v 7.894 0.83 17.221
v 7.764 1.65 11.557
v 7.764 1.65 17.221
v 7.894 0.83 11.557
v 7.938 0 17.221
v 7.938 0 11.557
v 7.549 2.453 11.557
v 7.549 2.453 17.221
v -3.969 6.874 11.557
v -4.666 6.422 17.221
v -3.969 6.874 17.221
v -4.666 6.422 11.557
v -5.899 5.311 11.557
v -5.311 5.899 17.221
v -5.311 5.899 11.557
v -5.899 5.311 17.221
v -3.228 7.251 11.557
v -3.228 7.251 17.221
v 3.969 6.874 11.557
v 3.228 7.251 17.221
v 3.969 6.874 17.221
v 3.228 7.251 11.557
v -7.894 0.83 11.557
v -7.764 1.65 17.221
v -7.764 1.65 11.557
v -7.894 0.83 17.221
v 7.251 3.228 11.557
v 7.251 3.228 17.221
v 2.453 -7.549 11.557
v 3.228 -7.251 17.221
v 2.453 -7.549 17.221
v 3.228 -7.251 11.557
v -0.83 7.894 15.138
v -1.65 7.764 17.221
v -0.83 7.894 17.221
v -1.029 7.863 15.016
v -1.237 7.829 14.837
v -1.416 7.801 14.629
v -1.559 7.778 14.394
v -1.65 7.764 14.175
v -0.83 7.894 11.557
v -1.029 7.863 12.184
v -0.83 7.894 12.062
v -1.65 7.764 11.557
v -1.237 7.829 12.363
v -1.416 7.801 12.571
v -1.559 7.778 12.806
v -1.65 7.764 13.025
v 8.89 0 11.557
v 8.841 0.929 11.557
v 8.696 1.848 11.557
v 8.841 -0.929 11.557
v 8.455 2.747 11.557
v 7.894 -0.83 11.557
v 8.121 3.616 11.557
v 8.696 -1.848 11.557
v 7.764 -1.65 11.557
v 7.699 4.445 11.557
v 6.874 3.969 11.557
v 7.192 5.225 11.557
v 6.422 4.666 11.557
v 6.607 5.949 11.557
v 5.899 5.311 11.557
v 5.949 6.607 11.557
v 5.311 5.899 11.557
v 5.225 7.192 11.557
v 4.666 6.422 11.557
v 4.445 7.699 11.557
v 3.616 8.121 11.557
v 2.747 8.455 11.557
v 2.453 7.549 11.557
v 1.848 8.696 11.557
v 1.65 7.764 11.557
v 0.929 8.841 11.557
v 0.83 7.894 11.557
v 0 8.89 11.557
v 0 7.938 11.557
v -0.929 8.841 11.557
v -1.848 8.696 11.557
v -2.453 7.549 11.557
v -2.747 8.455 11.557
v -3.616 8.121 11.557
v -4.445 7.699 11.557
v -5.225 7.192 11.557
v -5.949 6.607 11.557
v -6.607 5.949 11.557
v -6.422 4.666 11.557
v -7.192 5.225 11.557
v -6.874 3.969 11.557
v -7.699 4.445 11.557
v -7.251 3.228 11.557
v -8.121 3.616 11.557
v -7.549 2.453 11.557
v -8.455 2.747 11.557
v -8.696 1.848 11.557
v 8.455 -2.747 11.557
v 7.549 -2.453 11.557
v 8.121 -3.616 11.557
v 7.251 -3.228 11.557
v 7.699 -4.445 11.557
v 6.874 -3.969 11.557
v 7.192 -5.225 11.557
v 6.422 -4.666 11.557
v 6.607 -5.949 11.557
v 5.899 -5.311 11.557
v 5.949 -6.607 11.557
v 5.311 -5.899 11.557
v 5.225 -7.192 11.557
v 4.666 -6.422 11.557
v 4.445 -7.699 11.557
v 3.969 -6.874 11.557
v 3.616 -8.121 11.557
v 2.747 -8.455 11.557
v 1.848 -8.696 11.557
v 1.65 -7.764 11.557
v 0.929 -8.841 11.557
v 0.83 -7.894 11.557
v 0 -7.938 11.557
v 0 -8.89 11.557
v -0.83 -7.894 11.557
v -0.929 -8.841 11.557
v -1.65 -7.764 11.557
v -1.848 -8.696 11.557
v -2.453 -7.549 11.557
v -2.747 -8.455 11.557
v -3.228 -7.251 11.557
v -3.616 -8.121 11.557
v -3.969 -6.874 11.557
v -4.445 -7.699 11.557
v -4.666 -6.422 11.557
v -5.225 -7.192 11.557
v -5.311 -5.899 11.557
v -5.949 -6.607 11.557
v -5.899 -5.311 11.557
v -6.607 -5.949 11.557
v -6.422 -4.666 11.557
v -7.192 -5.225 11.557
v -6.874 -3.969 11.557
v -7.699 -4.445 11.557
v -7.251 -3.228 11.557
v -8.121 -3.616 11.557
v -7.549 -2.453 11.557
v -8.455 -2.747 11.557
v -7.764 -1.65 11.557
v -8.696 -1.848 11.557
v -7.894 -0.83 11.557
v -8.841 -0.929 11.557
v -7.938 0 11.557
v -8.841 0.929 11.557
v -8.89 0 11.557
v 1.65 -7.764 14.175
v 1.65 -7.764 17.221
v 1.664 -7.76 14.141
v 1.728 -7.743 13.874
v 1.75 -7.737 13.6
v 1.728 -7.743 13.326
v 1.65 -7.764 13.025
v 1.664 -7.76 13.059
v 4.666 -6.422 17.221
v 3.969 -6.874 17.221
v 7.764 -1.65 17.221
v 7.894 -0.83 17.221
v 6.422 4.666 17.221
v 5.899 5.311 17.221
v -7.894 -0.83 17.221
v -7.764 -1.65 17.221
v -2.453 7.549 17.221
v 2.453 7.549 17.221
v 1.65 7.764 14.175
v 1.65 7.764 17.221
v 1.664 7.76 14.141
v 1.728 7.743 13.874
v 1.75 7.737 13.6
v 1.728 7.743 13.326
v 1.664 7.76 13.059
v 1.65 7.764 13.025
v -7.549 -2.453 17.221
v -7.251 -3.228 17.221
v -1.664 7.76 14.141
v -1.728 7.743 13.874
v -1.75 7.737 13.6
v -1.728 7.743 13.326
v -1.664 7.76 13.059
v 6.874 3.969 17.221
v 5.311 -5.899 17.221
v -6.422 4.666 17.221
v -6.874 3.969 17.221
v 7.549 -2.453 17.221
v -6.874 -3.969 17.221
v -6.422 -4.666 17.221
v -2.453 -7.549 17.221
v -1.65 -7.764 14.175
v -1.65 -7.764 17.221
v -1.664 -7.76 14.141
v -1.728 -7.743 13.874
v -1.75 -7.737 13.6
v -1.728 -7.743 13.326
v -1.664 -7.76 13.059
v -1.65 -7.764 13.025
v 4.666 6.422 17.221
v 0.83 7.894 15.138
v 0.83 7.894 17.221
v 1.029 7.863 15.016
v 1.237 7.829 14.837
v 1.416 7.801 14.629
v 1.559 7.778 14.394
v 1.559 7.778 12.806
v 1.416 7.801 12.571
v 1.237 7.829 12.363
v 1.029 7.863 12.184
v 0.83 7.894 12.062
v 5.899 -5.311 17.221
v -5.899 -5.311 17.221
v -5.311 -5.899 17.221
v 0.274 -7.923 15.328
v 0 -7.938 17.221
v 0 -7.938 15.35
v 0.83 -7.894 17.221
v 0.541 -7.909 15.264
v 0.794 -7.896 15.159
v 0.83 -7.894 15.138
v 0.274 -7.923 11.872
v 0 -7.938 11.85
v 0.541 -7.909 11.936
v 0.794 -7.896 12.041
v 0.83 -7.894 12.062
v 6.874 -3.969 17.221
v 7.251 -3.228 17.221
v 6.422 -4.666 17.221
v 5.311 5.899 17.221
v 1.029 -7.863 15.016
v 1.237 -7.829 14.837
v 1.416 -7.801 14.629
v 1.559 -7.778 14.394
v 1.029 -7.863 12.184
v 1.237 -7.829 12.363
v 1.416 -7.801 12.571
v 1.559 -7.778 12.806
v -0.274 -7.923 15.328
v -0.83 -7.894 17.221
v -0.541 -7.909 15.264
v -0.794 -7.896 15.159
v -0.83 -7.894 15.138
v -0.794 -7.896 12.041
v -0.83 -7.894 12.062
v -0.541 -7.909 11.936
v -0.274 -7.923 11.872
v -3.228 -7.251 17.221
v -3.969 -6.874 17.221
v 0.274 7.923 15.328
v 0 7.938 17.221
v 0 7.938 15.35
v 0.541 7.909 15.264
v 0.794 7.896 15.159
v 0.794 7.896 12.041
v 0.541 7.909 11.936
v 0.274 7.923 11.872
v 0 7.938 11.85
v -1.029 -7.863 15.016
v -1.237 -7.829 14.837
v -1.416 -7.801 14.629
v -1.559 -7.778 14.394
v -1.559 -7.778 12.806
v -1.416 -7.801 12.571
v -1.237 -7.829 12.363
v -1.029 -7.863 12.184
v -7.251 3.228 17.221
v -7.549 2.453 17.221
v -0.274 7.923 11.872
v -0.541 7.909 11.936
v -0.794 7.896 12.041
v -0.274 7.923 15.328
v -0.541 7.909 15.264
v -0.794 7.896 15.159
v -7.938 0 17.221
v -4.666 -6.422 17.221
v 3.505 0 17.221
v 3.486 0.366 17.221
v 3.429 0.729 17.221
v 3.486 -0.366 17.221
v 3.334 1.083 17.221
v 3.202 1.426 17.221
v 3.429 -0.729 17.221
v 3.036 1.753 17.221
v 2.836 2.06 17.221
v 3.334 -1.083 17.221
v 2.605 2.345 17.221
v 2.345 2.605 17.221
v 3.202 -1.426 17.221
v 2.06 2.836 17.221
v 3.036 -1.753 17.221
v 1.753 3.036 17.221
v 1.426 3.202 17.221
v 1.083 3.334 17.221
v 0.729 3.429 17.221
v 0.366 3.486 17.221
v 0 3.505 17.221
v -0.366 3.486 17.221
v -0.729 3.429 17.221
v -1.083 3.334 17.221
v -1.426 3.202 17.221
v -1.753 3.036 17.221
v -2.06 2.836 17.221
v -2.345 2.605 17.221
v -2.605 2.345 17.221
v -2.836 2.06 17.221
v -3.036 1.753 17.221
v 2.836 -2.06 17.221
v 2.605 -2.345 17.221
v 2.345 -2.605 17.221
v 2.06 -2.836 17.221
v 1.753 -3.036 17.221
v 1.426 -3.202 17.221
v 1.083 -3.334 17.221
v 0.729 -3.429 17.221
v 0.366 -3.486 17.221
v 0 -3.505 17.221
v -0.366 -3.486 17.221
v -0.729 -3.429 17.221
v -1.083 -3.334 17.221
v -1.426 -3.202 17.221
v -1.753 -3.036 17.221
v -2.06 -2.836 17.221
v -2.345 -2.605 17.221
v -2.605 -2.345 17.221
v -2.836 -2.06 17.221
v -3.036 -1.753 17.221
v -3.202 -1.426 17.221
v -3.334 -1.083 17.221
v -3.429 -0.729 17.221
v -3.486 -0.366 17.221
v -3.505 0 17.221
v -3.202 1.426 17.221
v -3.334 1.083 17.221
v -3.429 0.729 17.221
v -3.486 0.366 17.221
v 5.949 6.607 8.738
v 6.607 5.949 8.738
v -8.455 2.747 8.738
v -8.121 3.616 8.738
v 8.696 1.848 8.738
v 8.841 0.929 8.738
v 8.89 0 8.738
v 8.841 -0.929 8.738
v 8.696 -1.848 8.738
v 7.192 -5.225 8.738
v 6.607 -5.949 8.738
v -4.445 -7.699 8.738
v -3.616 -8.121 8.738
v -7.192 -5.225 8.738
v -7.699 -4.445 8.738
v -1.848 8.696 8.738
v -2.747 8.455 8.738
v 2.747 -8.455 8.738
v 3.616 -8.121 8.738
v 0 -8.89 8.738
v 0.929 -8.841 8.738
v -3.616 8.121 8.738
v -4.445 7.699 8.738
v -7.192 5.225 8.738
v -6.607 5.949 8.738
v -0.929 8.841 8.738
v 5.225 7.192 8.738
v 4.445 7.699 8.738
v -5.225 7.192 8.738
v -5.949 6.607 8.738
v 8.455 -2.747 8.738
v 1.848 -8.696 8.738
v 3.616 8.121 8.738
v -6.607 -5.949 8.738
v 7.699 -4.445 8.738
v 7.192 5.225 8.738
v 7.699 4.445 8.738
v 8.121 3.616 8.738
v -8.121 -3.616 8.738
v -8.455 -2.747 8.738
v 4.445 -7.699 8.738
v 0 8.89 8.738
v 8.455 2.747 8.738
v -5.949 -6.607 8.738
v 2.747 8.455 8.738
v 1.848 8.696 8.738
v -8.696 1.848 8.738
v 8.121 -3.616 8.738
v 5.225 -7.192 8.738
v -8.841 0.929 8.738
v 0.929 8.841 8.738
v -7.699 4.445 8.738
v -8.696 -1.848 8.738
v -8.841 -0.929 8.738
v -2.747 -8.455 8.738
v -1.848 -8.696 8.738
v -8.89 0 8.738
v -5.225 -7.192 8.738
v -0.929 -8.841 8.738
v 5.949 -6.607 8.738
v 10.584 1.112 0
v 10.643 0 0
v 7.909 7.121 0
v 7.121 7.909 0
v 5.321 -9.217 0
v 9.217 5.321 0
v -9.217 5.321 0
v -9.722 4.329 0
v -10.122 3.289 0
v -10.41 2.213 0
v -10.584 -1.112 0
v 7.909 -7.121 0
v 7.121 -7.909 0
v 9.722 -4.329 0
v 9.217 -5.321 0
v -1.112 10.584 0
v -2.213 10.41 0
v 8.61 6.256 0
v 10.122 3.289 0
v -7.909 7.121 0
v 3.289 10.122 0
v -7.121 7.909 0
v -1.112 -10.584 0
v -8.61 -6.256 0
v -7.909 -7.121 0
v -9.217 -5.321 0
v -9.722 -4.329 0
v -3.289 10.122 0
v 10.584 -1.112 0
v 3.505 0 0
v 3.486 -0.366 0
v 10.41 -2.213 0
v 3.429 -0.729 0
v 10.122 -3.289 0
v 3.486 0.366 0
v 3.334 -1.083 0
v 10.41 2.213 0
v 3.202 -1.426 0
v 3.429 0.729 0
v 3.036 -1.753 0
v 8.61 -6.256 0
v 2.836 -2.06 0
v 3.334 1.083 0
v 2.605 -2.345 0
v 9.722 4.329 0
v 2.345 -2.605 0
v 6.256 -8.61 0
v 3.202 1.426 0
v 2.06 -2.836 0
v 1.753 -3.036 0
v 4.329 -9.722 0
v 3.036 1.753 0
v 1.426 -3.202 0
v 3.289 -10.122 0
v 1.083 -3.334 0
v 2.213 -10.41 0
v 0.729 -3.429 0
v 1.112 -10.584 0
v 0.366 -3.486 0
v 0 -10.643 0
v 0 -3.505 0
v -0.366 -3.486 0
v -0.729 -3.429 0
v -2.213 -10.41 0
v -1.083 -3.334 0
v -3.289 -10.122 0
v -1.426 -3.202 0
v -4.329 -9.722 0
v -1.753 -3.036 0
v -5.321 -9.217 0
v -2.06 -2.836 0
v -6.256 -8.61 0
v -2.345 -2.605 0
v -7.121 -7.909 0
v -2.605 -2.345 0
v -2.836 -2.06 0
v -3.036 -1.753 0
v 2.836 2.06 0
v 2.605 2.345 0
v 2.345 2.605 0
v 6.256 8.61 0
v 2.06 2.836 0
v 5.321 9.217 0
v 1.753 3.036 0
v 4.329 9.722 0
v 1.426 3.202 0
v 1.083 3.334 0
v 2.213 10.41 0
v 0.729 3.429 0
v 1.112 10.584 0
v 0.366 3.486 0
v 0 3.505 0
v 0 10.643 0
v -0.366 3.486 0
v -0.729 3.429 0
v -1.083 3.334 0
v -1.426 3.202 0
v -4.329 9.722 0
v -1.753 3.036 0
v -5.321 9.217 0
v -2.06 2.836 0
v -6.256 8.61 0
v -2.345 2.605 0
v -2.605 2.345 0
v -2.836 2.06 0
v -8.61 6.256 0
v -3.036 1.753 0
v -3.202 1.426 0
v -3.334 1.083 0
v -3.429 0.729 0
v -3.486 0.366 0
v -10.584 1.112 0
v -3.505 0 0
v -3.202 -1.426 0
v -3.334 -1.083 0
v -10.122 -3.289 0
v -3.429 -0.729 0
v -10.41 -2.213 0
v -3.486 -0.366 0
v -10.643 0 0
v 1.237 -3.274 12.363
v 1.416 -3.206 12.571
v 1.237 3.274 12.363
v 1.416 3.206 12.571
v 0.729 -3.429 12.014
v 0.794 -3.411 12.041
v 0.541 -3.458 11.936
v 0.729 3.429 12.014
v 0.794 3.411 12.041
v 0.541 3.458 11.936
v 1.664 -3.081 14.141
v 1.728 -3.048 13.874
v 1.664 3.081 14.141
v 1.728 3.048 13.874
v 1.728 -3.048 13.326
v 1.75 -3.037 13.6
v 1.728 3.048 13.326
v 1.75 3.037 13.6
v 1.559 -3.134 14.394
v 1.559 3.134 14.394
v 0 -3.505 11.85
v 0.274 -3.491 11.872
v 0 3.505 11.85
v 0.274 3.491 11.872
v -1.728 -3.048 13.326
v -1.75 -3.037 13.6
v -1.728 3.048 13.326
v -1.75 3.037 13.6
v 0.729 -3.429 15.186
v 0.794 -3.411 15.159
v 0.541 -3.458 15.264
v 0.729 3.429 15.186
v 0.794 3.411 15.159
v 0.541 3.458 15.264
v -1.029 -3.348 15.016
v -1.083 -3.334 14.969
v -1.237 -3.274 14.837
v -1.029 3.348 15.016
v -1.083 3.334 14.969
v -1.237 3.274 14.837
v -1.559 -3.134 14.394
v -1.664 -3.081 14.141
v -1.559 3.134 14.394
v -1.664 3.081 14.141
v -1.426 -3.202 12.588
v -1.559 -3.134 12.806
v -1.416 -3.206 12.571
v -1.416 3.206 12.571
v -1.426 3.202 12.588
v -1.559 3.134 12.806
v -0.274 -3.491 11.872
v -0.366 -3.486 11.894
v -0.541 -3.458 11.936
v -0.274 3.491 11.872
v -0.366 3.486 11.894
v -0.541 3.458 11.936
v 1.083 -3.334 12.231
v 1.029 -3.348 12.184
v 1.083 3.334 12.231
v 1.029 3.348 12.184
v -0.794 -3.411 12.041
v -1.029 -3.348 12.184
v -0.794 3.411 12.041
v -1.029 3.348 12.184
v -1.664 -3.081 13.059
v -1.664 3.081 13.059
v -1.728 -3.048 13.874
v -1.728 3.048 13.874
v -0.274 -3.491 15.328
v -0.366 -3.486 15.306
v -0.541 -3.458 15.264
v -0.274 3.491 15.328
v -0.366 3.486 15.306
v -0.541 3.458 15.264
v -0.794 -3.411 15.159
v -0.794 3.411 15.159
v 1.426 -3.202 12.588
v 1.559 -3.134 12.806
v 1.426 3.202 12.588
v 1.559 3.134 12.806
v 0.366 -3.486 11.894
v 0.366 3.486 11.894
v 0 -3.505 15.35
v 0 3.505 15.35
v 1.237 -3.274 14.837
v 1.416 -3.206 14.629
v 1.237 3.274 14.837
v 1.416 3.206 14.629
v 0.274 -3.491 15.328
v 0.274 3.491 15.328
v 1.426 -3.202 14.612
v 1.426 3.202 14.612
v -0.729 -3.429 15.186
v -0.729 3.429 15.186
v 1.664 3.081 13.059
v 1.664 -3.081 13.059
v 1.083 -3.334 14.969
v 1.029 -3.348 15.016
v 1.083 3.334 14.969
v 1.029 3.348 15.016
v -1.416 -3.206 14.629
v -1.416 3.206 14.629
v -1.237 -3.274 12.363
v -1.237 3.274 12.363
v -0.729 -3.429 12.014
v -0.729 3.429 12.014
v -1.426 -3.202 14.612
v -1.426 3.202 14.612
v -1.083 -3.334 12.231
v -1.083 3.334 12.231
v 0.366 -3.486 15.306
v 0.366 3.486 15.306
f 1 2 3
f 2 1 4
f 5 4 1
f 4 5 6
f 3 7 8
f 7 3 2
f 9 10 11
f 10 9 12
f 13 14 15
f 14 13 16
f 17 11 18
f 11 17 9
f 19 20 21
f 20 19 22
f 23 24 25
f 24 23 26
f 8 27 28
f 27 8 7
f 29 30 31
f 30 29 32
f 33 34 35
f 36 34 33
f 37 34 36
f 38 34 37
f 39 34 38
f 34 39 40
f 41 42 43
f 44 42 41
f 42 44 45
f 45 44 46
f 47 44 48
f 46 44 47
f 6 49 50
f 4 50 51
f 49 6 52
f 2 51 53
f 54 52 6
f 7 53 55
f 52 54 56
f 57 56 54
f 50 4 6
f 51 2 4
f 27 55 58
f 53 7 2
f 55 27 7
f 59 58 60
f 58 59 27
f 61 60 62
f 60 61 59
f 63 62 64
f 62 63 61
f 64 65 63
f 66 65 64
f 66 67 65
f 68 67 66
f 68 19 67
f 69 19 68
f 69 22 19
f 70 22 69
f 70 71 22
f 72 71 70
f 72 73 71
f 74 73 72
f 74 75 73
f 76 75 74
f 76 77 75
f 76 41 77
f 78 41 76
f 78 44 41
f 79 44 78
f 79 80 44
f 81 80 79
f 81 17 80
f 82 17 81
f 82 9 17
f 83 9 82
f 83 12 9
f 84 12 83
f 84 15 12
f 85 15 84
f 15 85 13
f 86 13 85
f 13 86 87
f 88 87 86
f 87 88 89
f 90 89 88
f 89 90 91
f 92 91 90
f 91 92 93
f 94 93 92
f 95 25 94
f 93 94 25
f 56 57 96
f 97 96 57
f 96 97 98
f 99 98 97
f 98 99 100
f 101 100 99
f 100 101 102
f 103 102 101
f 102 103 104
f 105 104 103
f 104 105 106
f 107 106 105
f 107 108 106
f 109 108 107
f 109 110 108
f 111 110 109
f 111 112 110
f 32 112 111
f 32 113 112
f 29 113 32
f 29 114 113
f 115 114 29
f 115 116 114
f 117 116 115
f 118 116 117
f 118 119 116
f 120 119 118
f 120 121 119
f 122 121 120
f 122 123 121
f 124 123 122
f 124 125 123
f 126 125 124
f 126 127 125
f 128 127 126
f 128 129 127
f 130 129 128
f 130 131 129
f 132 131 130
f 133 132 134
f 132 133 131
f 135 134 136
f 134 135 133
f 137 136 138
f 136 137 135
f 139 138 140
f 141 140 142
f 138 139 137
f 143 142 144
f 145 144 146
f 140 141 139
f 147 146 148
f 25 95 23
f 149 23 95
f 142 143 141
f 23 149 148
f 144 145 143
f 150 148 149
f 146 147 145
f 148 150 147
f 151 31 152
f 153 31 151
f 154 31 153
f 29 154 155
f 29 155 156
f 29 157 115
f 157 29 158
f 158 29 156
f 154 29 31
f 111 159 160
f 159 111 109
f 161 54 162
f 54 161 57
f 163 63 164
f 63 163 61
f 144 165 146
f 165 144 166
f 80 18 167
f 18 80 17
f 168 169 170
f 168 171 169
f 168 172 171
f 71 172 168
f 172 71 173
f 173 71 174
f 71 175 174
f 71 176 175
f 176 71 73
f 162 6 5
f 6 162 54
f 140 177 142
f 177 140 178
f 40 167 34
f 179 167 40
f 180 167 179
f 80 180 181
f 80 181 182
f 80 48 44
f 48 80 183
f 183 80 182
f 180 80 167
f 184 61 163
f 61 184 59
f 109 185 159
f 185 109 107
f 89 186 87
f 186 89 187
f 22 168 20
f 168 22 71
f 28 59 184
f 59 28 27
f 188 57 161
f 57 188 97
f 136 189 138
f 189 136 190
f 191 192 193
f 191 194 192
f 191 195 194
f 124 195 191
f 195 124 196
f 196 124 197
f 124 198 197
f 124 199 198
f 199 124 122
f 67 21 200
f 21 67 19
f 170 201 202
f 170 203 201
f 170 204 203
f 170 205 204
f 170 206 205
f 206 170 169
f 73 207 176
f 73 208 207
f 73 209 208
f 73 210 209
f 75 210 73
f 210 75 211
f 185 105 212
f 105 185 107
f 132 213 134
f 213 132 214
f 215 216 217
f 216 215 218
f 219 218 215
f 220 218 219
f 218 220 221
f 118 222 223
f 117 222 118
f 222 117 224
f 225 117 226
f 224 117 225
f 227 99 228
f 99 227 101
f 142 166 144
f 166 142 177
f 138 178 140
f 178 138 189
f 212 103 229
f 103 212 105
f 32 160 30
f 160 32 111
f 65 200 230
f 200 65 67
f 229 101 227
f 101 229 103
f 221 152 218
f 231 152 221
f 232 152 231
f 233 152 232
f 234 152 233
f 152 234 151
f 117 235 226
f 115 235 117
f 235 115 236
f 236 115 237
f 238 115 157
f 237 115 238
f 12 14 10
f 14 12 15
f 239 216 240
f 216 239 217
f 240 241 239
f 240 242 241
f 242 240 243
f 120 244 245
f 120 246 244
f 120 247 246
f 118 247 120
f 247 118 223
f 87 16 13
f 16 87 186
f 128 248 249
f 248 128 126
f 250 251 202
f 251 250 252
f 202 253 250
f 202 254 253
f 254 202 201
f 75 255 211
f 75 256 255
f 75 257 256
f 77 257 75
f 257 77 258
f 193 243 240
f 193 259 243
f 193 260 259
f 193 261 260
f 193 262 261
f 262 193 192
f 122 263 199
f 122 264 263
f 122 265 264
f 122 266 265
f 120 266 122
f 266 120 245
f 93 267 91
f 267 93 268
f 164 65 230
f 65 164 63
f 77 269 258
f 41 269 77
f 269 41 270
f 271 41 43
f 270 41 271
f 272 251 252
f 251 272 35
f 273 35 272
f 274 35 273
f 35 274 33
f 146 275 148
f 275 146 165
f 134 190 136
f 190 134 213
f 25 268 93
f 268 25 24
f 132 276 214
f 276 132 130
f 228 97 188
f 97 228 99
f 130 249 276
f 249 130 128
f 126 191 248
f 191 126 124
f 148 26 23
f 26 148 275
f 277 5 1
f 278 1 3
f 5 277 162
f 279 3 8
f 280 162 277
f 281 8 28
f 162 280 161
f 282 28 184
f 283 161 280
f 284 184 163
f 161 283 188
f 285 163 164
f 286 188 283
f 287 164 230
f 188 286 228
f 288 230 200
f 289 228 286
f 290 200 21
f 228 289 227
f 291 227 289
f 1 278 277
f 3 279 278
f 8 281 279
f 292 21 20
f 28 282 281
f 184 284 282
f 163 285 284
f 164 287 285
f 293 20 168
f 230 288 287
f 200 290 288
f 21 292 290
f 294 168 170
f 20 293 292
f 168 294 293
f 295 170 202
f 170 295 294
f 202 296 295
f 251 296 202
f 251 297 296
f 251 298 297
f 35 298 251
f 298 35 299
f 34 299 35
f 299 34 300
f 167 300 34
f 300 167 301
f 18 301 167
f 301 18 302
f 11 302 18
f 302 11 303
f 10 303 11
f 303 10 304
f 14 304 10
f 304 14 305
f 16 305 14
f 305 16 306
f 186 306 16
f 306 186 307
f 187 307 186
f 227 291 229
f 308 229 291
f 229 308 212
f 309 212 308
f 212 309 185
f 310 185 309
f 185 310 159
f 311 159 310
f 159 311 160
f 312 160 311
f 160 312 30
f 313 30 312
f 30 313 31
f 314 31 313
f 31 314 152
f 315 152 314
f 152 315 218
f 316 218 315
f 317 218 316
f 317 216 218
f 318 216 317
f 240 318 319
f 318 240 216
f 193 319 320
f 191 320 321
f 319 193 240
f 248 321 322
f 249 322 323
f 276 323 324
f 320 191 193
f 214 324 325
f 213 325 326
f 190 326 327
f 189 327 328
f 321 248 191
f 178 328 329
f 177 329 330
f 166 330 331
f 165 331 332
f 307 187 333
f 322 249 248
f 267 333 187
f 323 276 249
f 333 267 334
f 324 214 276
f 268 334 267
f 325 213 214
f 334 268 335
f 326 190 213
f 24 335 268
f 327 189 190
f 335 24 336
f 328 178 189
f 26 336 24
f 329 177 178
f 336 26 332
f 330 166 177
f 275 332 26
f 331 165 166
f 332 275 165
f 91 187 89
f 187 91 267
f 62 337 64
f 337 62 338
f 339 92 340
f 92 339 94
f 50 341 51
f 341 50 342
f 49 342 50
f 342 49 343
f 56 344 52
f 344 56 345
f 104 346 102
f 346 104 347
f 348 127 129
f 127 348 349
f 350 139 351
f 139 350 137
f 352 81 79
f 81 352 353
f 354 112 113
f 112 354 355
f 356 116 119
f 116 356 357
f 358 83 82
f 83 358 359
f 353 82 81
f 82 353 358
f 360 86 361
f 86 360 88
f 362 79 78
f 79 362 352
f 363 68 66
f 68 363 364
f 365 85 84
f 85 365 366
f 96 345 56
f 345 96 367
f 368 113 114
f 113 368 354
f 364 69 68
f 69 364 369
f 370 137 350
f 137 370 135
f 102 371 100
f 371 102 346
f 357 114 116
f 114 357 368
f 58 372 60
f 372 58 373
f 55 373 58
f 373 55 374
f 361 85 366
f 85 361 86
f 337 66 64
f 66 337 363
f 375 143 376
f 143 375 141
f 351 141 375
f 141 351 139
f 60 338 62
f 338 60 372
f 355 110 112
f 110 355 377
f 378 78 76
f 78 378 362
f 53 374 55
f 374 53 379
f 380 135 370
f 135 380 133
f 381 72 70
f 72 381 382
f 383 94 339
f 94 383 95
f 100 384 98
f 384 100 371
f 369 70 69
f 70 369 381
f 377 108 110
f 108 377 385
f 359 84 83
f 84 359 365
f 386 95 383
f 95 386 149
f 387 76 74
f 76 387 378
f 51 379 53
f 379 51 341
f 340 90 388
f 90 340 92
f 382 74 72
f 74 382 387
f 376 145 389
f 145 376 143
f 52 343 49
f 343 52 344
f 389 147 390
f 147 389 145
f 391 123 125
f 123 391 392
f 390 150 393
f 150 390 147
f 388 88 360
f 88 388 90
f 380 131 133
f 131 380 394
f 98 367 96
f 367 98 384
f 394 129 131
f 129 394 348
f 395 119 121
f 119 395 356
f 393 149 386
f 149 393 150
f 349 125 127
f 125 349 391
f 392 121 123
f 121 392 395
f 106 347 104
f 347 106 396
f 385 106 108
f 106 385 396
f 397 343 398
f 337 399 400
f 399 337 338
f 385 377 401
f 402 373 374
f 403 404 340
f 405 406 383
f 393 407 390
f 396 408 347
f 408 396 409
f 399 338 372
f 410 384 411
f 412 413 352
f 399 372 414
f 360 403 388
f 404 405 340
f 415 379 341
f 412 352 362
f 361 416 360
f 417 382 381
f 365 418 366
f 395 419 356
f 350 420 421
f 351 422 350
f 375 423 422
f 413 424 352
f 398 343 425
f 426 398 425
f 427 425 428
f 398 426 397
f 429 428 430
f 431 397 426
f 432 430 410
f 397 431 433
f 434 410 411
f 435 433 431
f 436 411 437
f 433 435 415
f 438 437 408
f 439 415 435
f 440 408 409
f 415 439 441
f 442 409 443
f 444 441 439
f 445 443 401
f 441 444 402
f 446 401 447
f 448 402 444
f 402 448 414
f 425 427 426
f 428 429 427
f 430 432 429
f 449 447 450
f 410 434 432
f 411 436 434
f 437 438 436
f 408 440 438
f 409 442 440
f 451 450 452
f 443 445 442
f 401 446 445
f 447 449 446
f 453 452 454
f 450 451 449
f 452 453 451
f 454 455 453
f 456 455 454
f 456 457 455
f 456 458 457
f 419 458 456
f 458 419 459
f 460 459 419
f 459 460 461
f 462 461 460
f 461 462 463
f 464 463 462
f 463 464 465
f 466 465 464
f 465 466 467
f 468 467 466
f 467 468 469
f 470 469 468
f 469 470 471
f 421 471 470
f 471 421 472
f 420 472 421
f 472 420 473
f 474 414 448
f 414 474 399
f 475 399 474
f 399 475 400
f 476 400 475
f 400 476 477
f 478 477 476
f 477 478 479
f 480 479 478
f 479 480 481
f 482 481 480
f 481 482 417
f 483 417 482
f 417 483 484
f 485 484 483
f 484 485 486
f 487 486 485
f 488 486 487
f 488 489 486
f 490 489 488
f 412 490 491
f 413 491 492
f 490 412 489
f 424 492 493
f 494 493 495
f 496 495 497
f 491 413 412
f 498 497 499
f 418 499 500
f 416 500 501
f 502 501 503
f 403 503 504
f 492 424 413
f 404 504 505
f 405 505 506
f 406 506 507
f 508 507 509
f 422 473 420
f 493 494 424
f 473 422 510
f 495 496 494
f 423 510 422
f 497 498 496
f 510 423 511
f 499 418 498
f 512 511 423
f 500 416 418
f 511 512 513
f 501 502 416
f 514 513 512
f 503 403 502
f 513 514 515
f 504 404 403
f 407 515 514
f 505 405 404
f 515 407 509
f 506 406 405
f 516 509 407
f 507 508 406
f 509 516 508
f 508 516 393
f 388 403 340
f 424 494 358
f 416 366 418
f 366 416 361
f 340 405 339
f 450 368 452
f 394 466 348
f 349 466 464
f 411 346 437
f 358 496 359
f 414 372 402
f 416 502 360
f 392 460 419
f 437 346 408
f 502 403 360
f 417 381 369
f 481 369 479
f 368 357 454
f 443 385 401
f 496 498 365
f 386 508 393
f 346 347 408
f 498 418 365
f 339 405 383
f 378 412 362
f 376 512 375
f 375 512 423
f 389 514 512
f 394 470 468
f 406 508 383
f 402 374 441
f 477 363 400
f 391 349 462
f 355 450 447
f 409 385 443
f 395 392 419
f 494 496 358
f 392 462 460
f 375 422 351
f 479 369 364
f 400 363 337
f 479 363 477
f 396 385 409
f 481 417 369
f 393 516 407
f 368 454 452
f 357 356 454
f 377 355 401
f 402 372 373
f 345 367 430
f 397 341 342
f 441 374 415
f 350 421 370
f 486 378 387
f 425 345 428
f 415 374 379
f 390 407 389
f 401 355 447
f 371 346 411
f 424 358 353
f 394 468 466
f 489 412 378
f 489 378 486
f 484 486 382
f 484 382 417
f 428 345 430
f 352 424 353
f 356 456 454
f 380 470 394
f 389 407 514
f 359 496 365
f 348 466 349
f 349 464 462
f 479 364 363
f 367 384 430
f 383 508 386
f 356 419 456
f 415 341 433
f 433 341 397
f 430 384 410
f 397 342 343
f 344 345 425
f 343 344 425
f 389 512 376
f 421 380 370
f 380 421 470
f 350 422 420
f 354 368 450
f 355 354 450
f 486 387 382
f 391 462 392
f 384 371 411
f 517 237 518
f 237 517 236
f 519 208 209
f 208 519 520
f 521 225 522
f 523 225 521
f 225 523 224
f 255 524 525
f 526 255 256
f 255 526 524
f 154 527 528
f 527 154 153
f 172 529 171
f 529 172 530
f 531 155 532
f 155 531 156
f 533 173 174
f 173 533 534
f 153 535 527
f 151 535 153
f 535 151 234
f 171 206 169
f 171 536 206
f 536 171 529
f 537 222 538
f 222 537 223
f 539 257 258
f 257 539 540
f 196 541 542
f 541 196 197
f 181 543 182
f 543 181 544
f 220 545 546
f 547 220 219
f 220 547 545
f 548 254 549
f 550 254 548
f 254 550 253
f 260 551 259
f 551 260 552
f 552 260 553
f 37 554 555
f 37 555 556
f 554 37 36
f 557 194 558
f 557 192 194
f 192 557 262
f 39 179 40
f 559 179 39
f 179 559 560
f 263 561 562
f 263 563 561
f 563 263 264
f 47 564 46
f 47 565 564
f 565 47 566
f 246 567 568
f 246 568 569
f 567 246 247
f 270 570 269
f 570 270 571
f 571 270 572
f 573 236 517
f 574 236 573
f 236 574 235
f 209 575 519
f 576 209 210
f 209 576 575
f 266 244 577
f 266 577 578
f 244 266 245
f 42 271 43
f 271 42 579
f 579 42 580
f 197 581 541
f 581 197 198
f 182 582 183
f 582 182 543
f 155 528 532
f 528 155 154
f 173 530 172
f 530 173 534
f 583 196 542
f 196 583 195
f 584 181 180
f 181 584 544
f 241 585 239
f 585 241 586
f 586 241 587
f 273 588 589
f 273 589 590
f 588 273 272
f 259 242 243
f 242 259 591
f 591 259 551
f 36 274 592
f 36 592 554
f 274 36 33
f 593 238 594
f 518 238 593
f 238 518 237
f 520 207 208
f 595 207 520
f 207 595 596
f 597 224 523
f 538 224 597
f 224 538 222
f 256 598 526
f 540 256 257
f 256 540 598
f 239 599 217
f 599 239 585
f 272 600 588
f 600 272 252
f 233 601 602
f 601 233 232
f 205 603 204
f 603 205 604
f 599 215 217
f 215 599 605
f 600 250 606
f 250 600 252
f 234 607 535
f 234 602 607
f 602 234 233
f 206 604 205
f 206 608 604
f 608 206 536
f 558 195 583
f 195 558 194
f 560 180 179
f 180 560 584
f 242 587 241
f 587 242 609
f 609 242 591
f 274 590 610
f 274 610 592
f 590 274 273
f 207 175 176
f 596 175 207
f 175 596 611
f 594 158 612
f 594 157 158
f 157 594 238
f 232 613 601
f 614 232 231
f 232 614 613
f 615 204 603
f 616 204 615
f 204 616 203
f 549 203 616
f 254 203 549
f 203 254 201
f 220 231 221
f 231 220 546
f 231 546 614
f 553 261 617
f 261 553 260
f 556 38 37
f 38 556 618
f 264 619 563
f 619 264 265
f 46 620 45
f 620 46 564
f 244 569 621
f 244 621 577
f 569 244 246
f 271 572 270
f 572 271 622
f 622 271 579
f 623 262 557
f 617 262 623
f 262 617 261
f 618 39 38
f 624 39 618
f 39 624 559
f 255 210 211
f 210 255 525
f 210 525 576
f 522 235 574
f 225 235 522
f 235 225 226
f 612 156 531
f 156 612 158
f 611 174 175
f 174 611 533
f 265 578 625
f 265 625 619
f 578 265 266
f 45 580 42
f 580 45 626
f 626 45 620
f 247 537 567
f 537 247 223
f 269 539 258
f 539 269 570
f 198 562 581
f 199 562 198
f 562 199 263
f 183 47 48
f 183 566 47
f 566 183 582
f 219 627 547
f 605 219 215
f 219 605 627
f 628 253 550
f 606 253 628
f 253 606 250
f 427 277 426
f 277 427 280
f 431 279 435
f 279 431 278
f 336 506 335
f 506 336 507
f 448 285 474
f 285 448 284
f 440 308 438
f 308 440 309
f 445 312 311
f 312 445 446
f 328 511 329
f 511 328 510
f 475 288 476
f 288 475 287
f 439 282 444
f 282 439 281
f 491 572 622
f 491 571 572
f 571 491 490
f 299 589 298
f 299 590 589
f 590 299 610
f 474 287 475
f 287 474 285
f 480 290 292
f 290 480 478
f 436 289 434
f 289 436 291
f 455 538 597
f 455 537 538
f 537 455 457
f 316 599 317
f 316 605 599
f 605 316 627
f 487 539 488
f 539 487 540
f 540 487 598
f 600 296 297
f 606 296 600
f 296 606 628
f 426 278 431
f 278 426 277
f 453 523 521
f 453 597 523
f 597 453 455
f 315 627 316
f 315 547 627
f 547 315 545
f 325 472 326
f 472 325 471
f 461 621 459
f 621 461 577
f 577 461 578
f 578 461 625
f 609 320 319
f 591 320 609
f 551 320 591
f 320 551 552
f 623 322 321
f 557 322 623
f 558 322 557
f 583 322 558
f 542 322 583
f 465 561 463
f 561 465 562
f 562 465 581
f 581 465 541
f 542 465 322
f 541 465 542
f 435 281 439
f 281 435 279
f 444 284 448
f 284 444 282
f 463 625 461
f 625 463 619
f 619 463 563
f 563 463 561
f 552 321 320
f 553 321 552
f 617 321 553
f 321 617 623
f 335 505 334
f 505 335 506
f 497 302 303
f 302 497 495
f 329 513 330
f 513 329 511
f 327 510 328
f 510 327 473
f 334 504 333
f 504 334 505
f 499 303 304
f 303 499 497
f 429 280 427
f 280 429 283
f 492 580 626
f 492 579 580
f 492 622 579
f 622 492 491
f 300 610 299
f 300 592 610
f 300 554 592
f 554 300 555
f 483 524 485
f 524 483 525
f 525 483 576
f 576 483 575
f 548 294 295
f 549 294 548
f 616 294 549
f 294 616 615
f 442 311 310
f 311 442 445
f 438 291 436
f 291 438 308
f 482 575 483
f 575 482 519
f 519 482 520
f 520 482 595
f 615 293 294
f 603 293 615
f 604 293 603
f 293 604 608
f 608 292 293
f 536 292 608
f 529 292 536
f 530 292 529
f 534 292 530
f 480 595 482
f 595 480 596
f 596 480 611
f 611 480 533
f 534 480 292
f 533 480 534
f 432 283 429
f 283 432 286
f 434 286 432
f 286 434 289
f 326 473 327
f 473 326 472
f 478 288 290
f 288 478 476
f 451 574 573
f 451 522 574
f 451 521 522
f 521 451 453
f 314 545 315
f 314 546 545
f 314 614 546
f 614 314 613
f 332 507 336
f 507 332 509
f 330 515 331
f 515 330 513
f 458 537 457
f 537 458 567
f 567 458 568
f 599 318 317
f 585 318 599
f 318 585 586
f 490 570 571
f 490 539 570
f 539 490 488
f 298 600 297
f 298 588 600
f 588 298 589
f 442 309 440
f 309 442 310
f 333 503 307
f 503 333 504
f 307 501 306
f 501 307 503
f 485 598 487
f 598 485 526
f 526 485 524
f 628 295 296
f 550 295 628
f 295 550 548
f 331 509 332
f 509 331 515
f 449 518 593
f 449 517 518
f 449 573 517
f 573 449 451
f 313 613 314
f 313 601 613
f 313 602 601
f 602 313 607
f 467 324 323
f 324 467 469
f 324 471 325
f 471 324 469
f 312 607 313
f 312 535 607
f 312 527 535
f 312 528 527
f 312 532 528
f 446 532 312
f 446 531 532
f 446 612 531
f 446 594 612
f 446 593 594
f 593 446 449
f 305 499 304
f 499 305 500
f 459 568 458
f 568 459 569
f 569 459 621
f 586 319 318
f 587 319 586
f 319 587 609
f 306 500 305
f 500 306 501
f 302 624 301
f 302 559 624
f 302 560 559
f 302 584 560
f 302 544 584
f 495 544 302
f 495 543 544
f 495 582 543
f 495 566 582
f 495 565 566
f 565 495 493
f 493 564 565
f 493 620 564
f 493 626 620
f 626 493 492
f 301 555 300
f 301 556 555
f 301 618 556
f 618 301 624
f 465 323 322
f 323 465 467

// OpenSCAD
difference() {
	union() {
		translate([0, 0, 11.55700])
			cylinder(h=5.6642, r=7.9375, $fn=60);

		translate([0, 0, 8.7376])
			cylinder(h=2.8194, r=8.89, $fn=60);

		cylinder(h=8.7376, r1=10.6426, r2=8.89, $fn=60);
	}

    translate([0, 8, 13.6])
		rotate([90, 0, 0])
		cylinder(h=16, r=1.75, $fn=40);

	cylinder(h=17.7, r=3.5052, $fn=60);
}
